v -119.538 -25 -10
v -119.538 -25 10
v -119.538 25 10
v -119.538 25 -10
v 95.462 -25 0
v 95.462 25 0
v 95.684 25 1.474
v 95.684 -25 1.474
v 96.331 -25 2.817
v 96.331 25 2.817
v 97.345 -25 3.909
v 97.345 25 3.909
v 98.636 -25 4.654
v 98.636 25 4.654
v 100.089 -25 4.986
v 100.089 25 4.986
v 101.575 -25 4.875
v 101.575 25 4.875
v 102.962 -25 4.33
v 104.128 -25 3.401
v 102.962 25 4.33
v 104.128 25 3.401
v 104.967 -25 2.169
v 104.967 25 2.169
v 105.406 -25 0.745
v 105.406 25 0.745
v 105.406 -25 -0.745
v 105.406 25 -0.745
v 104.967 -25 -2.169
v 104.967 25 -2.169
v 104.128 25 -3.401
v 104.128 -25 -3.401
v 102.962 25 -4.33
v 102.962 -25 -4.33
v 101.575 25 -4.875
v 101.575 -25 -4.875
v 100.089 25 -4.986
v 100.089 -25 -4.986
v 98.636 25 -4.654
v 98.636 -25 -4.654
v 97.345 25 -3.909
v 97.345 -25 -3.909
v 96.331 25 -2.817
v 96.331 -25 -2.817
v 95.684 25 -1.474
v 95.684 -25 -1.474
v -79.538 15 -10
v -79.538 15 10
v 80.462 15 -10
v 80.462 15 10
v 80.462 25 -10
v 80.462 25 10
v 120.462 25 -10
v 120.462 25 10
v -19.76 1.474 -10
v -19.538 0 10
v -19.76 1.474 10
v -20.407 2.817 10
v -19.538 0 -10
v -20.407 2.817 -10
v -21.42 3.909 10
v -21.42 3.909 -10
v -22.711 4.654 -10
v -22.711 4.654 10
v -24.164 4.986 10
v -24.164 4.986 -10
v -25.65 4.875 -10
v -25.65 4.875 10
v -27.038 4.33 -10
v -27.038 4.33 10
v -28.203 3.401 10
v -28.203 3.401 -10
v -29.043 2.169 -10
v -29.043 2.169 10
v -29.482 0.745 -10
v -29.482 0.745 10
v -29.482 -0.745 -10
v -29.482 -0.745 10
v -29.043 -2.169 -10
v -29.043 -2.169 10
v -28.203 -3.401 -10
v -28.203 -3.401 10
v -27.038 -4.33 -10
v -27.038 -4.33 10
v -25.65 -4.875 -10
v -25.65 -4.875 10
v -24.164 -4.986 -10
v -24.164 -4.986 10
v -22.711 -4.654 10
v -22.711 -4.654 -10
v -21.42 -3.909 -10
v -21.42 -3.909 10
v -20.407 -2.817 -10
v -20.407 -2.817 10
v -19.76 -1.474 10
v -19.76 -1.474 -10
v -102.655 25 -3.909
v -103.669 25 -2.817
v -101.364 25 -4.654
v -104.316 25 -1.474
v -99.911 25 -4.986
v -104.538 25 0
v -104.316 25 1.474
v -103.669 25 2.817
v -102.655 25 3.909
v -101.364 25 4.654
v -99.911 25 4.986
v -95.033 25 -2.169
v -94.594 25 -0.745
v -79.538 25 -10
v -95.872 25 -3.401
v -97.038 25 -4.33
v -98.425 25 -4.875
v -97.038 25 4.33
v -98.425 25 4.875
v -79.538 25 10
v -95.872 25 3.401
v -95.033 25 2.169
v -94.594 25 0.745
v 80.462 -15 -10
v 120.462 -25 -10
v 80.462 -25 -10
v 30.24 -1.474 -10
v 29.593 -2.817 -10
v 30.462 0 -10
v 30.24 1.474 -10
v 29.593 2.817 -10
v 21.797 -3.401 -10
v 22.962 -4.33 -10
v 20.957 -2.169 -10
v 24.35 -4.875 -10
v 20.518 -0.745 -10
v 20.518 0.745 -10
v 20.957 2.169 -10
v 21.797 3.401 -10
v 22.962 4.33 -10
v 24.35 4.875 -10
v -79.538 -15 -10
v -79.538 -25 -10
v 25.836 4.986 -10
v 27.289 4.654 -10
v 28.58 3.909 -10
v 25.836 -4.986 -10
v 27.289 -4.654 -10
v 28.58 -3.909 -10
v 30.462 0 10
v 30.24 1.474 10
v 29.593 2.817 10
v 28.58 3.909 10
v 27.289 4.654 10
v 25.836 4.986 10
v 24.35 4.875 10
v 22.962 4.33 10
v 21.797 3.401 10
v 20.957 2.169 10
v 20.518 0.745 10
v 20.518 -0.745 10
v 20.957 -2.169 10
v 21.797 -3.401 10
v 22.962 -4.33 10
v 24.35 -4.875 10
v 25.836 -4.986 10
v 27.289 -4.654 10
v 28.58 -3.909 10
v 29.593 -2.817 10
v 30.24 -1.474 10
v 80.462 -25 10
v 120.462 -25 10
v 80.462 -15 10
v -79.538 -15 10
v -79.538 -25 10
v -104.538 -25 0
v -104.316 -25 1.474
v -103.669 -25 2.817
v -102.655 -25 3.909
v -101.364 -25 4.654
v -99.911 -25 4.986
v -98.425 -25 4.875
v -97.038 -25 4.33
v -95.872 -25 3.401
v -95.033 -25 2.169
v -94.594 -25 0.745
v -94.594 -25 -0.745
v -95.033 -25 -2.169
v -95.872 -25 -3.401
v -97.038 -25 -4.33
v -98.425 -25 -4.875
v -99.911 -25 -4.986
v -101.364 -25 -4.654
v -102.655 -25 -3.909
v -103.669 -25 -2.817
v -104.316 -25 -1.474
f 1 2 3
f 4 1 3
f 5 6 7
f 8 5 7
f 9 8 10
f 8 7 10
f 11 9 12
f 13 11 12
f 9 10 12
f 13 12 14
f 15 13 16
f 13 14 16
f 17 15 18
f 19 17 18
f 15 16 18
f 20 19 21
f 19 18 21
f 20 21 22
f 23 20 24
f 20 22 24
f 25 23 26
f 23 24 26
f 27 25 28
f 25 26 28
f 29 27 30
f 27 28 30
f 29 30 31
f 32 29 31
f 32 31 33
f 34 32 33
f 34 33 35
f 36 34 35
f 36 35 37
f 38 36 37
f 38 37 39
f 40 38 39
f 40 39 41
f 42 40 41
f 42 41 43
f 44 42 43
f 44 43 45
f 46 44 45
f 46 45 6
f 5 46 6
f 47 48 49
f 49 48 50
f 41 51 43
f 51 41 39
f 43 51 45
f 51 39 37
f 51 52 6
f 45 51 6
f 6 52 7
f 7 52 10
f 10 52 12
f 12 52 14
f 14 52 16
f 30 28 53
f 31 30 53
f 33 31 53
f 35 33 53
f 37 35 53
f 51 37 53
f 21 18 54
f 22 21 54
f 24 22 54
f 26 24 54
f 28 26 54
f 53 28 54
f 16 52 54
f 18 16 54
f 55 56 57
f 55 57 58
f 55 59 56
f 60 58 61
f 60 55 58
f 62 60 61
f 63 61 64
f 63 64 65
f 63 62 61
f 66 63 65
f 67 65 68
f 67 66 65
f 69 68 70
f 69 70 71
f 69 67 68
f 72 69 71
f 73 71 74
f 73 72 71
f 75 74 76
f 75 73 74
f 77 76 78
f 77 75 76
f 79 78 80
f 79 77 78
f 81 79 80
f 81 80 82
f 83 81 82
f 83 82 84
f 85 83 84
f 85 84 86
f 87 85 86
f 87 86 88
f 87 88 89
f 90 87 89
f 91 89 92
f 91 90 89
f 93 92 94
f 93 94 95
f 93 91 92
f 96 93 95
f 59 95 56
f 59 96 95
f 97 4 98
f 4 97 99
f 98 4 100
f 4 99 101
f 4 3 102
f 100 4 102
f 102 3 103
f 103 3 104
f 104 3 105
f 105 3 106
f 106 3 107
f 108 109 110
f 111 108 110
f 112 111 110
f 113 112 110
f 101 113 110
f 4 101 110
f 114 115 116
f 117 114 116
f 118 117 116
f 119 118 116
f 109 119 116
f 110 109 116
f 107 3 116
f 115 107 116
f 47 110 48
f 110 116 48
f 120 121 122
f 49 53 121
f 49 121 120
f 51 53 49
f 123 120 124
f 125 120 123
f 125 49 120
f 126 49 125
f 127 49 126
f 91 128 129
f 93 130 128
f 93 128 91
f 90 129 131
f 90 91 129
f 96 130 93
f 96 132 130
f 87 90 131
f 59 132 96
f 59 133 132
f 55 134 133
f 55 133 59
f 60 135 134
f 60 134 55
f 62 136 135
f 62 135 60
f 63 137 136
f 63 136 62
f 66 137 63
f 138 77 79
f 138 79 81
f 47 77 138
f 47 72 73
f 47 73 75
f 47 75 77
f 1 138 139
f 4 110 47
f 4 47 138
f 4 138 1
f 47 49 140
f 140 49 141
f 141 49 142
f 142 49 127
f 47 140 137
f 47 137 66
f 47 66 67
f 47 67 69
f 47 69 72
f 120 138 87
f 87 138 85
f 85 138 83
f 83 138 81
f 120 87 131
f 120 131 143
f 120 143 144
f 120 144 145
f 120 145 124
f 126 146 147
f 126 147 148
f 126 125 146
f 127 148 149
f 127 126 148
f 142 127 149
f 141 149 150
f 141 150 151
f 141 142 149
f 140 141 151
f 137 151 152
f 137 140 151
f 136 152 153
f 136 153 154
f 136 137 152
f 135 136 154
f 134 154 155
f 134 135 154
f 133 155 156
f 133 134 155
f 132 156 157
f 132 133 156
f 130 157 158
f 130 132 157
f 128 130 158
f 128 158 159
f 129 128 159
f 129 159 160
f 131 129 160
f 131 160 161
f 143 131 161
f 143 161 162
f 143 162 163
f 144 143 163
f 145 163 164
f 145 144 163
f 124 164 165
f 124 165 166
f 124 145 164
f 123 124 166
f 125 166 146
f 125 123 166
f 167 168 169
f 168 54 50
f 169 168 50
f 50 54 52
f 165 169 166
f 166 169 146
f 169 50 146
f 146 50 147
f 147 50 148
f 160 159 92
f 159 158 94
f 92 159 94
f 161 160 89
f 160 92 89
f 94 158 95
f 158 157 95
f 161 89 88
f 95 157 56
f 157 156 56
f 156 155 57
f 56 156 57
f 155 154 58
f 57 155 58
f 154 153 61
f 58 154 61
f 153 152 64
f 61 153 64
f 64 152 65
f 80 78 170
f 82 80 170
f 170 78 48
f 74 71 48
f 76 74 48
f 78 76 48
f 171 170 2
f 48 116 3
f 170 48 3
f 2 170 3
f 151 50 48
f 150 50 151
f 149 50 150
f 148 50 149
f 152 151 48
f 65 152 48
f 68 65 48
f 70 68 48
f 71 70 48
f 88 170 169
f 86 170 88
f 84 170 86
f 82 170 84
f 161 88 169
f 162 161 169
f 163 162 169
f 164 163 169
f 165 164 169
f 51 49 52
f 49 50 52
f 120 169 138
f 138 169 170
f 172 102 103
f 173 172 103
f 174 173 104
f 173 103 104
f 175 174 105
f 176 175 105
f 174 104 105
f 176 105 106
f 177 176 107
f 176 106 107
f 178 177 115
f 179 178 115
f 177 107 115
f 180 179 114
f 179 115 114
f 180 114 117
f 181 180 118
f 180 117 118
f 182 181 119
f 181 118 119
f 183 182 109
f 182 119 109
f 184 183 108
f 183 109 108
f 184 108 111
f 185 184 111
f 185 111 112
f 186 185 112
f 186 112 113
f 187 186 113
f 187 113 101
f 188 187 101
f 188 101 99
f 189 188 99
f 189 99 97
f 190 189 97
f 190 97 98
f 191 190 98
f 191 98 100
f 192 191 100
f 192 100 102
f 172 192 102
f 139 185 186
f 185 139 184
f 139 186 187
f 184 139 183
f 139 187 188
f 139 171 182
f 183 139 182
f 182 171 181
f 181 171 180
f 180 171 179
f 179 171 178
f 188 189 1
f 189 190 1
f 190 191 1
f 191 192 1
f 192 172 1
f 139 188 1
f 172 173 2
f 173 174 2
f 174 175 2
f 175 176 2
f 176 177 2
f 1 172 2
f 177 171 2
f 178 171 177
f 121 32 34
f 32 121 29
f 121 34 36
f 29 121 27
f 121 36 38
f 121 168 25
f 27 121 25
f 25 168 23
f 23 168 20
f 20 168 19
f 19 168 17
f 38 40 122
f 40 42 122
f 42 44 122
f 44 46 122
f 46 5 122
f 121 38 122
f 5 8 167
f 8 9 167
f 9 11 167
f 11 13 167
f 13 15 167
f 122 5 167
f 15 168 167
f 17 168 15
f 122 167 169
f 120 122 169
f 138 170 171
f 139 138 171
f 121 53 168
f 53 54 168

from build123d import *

# Parameters (mm, degrees)
ESQUISSE1_R             = 5
BOSS_EXTRU_2_DEPTH      = 10
ESQUISSE3_R             = 5
ENL_V_MAT_EXTRU_1_DEPTH = 51


with BuildPart() as part:
    # Esquisse1 → Boss.-Extru.2 (new body, symmetric)
    with BuildSketch(Plane.XY):
        Polygon((-119.537747133, 25), (-79.537747133, 25), (-79.537747133, 15), (80.462252867, 15), (80.462252867, 25), (120.462252867, 25), (120.462252867, -25), (80.462252867, -25), (80.462252867, -15), (-79.537747133, -15), (-79.537747133, -25), (-119.537747133, -25), align=None)
        with Locations((-24.537747133, 0)):
            Circle(ESQUISSE1_R, mode=Mode.SUBTRACT)
        with Locations((25.462252867, 0)):
            Circle(ESQUISSE1_R, mode=Mode.SUBTRACT)
    extrude(amount=BOSS_EXTRU_2_DEPTH, both=True)

    # Esquisse3 → Enlèv. mat.-Extru.1 (cut, through all)
    with BuildSketch(Plane(origin=(0, 25, 0), x_dir=(1, 0, 0), z_dir=(0, 1, 0))):
        with Locations(Location((-99.537747133, 0, 0), (0, 0, 180))):  # turned: the seam where the file's is
            Circle(ESQUISSE3_R)
        with Locations(Location((100.462252867, 0, 0), (0, 0, 180))):  # turned: the seam where the file's is
            Circle(ESQUISSE3_R)
    extrude(amount=-ENL_V_MAT_EXTRU_1_DEPTH, mode=Mode.SUBTRACT)


solid = part.part
